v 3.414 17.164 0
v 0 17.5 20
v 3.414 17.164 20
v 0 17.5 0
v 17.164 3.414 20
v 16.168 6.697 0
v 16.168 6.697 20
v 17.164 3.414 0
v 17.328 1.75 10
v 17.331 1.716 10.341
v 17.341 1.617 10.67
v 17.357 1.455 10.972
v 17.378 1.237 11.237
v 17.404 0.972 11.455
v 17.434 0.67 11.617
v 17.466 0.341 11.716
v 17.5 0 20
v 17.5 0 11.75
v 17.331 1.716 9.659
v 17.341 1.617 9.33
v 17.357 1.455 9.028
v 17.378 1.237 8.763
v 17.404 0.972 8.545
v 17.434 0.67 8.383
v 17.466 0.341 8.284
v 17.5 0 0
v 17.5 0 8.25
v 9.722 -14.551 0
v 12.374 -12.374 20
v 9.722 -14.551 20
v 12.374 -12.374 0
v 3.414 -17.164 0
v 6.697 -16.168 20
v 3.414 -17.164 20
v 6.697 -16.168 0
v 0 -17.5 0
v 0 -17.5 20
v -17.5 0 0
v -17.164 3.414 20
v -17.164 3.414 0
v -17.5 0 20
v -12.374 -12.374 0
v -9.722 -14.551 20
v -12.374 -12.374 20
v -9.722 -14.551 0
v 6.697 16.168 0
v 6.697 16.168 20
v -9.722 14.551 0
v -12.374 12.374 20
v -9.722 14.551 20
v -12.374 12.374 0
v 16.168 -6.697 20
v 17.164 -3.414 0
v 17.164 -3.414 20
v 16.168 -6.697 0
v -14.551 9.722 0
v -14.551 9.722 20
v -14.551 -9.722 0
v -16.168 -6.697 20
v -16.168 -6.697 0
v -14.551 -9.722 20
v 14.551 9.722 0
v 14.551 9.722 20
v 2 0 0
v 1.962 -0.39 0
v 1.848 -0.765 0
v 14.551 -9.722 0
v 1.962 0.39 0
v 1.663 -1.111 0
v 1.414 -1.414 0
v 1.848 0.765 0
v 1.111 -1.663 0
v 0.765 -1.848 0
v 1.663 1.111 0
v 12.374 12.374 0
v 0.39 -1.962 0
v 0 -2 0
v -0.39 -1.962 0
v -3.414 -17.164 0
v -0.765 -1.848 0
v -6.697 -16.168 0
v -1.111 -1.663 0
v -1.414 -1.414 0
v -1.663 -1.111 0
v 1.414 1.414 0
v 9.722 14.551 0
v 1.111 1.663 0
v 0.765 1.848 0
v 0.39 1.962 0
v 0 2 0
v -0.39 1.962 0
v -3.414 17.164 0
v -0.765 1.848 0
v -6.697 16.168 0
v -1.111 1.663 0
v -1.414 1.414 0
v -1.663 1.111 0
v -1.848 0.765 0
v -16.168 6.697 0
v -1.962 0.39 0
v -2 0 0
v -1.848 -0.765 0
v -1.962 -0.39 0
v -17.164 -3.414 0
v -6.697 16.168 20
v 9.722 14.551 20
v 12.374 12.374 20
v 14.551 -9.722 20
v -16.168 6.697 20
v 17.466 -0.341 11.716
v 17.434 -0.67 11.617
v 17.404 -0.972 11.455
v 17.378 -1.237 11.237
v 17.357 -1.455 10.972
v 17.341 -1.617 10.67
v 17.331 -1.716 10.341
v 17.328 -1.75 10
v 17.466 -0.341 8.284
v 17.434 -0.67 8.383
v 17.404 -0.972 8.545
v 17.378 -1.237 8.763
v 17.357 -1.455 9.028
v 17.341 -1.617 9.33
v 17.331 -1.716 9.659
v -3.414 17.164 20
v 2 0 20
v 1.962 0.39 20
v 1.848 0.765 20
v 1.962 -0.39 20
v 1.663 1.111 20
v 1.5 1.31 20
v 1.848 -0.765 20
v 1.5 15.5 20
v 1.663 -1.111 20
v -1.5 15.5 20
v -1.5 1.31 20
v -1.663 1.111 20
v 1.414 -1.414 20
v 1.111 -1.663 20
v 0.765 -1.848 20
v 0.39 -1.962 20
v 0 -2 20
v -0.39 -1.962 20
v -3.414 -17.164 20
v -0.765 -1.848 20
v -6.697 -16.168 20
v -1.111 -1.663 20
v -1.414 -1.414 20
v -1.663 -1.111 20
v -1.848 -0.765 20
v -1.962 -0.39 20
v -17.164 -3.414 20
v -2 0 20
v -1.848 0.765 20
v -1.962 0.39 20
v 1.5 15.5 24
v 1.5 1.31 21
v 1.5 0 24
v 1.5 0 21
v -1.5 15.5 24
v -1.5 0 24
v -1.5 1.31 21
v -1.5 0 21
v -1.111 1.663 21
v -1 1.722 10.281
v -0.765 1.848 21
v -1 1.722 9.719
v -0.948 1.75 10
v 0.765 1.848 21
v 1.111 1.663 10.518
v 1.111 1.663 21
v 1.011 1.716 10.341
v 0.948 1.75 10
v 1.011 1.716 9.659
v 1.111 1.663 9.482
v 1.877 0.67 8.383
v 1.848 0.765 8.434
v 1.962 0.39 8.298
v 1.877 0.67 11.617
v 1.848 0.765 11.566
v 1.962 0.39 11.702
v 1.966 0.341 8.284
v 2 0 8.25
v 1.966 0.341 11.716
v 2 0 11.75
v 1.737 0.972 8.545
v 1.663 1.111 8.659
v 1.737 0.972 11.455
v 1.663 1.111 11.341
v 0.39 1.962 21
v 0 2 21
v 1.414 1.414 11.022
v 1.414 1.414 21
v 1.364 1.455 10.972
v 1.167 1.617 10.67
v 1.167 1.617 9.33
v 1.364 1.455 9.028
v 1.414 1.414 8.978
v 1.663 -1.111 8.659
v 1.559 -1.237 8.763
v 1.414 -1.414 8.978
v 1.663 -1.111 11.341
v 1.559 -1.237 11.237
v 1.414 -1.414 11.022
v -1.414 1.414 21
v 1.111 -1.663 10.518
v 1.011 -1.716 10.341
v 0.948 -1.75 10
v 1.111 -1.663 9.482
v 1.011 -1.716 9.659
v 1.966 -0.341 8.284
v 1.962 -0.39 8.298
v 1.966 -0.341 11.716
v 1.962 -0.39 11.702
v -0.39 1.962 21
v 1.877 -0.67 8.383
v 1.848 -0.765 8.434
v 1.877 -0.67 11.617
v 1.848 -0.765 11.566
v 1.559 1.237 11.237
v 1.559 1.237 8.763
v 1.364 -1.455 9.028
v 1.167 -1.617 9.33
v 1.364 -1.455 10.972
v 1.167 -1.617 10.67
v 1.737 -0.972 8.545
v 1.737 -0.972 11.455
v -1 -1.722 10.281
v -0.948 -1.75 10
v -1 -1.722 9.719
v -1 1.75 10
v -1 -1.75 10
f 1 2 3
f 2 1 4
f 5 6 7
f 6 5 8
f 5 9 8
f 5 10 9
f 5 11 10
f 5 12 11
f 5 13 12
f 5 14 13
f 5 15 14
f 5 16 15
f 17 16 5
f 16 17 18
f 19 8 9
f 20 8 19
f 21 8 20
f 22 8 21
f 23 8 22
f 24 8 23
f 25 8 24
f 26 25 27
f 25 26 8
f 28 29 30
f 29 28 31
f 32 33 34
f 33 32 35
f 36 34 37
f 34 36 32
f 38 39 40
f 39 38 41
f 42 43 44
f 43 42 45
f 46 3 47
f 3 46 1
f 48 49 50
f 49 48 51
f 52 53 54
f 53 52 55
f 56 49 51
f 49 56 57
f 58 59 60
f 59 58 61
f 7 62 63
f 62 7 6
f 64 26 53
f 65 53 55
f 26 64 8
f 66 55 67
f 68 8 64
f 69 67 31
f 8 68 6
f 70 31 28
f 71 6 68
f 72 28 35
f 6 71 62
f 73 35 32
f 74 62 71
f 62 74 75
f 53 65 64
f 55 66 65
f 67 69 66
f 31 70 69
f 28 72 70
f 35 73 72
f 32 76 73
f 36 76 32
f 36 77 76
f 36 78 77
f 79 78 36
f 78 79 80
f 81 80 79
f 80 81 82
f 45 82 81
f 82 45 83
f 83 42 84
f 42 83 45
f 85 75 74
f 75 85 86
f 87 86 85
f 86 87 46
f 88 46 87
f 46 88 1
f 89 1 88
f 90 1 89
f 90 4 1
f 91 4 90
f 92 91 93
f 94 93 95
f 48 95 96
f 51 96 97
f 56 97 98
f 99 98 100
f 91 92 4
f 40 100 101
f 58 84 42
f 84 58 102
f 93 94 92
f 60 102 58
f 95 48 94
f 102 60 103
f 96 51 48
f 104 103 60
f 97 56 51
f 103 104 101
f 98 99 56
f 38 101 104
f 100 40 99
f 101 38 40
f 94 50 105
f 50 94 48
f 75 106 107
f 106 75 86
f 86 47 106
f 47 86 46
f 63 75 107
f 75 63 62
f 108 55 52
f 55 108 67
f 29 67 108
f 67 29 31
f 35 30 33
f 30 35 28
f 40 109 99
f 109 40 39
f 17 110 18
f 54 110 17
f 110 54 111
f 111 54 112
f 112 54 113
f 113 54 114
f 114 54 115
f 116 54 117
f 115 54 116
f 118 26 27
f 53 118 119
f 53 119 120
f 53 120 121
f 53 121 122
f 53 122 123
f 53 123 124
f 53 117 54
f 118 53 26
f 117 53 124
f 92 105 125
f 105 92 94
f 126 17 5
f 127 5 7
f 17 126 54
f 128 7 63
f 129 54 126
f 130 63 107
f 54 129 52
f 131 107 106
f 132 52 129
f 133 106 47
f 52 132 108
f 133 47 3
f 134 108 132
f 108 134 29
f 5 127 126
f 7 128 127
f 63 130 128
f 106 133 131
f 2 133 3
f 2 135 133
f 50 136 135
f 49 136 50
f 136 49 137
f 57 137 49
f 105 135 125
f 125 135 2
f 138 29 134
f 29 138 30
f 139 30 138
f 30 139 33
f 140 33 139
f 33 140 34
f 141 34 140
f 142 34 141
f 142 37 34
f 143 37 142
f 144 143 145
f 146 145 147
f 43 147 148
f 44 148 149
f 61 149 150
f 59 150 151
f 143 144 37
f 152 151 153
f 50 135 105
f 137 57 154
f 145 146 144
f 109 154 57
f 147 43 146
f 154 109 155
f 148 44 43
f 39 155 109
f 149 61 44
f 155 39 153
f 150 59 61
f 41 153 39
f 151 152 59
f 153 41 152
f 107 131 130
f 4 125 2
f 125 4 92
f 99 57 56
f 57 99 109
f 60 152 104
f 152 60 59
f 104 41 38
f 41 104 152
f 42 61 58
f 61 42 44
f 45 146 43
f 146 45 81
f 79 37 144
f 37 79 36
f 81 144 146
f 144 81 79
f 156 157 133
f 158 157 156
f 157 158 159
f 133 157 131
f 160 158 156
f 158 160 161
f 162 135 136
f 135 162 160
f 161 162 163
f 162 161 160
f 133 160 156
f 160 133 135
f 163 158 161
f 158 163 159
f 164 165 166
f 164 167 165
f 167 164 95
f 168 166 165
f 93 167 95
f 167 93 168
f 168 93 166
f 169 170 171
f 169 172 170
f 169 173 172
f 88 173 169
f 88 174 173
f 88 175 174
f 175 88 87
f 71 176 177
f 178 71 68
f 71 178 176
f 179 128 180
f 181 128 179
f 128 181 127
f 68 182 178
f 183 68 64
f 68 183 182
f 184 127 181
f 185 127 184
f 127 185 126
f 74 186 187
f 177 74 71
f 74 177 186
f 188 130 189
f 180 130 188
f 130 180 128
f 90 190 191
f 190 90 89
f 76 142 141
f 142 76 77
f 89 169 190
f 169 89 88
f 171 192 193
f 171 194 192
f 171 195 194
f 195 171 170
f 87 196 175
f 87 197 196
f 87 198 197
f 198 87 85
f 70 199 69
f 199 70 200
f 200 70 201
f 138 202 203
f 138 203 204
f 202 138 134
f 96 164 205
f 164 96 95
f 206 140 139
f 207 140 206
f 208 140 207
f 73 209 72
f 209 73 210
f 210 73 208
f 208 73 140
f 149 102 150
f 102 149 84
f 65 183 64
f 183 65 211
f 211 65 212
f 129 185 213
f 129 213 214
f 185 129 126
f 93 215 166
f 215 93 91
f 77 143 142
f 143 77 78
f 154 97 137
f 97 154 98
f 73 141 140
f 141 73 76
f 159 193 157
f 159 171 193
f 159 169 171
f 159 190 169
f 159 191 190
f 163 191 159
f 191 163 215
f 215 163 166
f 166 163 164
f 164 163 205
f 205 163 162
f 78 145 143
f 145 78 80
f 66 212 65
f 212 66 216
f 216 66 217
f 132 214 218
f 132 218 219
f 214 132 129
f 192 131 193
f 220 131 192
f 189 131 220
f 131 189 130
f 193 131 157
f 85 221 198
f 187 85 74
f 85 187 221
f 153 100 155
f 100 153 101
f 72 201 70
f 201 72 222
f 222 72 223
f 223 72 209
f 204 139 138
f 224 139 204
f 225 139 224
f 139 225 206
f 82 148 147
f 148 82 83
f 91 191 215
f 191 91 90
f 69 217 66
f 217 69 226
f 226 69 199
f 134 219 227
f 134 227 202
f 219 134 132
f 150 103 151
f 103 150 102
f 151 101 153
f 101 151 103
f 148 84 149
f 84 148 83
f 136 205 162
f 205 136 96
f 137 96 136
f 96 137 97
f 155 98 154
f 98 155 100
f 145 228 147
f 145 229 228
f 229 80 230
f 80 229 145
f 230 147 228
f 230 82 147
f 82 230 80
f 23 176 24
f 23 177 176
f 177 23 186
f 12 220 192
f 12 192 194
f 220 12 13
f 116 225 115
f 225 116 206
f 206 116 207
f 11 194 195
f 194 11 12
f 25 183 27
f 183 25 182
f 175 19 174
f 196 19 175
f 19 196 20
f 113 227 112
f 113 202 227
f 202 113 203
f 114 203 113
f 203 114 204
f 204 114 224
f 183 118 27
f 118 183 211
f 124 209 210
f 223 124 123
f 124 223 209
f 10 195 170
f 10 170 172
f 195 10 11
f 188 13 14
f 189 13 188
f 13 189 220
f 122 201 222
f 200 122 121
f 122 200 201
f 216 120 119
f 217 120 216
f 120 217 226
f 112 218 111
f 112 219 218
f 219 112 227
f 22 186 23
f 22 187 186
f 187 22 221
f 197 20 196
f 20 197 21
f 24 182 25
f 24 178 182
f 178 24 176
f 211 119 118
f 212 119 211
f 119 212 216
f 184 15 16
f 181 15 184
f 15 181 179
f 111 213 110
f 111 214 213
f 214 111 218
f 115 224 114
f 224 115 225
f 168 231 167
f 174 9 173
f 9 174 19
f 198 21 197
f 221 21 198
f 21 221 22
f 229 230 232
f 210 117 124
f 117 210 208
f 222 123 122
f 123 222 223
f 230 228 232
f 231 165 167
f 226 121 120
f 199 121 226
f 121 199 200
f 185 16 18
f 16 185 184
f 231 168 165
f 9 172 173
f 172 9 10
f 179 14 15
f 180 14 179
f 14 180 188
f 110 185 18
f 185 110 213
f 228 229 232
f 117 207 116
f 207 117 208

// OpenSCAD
$fn = 32;

// ----------------------------------------------------------------------
// Control knob: pointer knob
// ----------------------------------------------------------------------

// --- parameters (mm) ---
rib_w = 3;                // pointer rib width
rib_h = 5;                // pointer rib height
knob_d = 35;              // knob body diameter
knob_h = 20;              // knob body height
bore_d = 4;               // shaft bore diameter
set_d = 3.5;              // set screw bore diameter
fit_tol = 0.02;           // tolerance for press fits, mm
free_tol = 0.2;           // tolerance for clearance fits, mm

rib_poke = rib_h - 1;  // rib height above the top
total_h = knob_h + rib_h - 1;  // overall height

difference() {
  union() {
    cylinder(h = knob_h, d = knob_d);
    translate([-rib_w / 2, 0, knob_h - 1])
      cube([rib_w, knob_d / 2 - 2, rib_h]);
  }
  translate([0, 0, -1]) cylinder(h = knob_h + 2, d = bore_d);
  translate([-1, 0, knob_h / 2]) rotate([0, 90, 0])
    cylinder(h = knob_d / 2 + bore_d / 2 + 2, d = set_d);}
